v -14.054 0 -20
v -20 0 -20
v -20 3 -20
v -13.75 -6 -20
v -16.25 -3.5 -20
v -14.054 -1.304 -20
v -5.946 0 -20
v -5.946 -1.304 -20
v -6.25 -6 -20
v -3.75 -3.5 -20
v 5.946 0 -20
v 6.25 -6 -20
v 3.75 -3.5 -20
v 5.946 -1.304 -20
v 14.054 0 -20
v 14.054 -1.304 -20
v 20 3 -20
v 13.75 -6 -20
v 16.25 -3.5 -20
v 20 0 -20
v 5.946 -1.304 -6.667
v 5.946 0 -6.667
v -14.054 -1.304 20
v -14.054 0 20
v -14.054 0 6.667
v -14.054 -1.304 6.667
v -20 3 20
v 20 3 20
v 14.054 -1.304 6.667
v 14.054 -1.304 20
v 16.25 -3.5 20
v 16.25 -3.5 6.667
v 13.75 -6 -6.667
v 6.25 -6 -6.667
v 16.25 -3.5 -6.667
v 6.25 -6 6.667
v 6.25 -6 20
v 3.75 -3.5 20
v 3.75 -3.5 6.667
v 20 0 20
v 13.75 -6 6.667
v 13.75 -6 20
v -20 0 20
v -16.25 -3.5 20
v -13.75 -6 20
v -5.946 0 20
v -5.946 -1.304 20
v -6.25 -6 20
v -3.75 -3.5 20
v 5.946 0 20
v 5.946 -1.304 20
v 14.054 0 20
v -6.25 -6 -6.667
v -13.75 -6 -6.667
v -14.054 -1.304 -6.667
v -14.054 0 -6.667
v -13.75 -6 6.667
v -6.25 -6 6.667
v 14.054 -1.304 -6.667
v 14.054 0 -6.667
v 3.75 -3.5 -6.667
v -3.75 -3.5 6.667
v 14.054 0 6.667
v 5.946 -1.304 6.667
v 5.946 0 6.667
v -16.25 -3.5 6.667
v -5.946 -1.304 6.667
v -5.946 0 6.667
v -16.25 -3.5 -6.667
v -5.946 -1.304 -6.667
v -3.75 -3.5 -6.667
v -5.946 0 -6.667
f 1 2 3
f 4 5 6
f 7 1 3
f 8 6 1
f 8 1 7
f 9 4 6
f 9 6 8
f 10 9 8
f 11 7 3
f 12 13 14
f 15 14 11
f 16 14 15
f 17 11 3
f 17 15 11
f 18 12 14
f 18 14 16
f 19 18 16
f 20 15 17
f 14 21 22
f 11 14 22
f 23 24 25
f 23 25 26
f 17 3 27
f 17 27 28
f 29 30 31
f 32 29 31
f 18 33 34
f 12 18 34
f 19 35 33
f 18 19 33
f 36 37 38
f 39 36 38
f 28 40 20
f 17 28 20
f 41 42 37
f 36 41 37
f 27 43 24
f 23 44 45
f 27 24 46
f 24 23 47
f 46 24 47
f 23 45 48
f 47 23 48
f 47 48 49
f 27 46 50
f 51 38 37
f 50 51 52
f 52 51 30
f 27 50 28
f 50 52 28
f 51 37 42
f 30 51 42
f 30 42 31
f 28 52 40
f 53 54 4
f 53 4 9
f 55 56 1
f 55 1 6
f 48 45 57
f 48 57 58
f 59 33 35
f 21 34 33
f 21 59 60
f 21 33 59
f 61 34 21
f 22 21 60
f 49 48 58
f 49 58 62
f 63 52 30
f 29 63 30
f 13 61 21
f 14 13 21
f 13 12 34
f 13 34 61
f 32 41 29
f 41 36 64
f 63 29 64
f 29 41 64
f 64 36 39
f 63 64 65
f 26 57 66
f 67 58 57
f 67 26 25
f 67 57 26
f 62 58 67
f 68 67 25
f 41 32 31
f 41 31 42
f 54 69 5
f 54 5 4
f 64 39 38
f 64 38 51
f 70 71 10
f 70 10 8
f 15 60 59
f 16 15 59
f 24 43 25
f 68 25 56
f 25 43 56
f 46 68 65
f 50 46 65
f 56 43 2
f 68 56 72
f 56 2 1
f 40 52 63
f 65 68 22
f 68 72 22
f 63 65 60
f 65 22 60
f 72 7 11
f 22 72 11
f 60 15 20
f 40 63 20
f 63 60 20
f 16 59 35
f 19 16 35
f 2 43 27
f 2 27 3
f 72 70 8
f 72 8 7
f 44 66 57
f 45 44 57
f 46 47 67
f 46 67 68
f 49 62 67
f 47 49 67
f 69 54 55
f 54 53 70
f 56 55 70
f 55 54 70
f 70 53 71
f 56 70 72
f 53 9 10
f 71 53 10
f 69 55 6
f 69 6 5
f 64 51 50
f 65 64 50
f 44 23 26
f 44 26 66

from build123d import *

# Parameters (mm, degrees)
SKETCH1_W           = 40
SKETCH1_H           = 40
BOSS_EXTRUDE1_DEPTH = 3
BOSS_EXTRUDE2_DEPTH = 40
SKETCH3_W           = 13.333333334
SKETCH3_H           = 6
CUT_EXTRUDE1_DEPTH  = 29.91366459


with BuildPart() as part:
    # Sketch1 → Boss-Extrude1 (new body)
    with BuildSketch(Plane(origin=(0, 0, 0), x_dir=(1, 0, 0), z_dir=(0, 1, 0))):
        Rectangle(SKETCH1_W, SKETCH1_H)
    extrude(amount=BOSS_EXTRUDE1_DEPTH)

    # Sketch2 → Boss-Extrude2 (add)
    with BuildSketch(Plane.XY.offset(20)):
        Polygon((-13.75, -6), (-6.25, -6), (-3.75, -3.5), (-5.946498308, -1.303501692), (-5.946498308, 0), (-14.053501692, 0), (-14.053501692, -1.303501692), (-16.25, -3.5), align=None)
    boss_extrude2 = extrude(amount=-BOSS_EXTRUDE2_DEPTH)

    # Sketch3 → Cut-Extrude1 (cut, through all)
    with BuildSketch(Plane(origin=(0, 0, 0), x_dir=(0, 0, -1), z_dir=(1, 0, 0))):
        with Locations((0, -3)):
            Rectangle(SKETCH3_W, SKETCH3_H)
    cut_extrude1 = extrude(amount=-CUT_EXTRUDE1_DEPTH, mode=Mode.SUBTRACT)

    # Mirror1: Boss-Extrude2, Cut-Extrude1 across plane
    add(boss_extrude2.mirror(Plane(origin=(0, 0, 0), x_dir=(0, 0, 1), z_dir=(1, 0, 0))))
    add(cut_extrude1.mirror(Plane(origin=(0, 0, 0), x_dir=(0, 0, 1), z_dir=(1, 0, 0))), mode=Mode.SUBTRACT)


solid = part.part
